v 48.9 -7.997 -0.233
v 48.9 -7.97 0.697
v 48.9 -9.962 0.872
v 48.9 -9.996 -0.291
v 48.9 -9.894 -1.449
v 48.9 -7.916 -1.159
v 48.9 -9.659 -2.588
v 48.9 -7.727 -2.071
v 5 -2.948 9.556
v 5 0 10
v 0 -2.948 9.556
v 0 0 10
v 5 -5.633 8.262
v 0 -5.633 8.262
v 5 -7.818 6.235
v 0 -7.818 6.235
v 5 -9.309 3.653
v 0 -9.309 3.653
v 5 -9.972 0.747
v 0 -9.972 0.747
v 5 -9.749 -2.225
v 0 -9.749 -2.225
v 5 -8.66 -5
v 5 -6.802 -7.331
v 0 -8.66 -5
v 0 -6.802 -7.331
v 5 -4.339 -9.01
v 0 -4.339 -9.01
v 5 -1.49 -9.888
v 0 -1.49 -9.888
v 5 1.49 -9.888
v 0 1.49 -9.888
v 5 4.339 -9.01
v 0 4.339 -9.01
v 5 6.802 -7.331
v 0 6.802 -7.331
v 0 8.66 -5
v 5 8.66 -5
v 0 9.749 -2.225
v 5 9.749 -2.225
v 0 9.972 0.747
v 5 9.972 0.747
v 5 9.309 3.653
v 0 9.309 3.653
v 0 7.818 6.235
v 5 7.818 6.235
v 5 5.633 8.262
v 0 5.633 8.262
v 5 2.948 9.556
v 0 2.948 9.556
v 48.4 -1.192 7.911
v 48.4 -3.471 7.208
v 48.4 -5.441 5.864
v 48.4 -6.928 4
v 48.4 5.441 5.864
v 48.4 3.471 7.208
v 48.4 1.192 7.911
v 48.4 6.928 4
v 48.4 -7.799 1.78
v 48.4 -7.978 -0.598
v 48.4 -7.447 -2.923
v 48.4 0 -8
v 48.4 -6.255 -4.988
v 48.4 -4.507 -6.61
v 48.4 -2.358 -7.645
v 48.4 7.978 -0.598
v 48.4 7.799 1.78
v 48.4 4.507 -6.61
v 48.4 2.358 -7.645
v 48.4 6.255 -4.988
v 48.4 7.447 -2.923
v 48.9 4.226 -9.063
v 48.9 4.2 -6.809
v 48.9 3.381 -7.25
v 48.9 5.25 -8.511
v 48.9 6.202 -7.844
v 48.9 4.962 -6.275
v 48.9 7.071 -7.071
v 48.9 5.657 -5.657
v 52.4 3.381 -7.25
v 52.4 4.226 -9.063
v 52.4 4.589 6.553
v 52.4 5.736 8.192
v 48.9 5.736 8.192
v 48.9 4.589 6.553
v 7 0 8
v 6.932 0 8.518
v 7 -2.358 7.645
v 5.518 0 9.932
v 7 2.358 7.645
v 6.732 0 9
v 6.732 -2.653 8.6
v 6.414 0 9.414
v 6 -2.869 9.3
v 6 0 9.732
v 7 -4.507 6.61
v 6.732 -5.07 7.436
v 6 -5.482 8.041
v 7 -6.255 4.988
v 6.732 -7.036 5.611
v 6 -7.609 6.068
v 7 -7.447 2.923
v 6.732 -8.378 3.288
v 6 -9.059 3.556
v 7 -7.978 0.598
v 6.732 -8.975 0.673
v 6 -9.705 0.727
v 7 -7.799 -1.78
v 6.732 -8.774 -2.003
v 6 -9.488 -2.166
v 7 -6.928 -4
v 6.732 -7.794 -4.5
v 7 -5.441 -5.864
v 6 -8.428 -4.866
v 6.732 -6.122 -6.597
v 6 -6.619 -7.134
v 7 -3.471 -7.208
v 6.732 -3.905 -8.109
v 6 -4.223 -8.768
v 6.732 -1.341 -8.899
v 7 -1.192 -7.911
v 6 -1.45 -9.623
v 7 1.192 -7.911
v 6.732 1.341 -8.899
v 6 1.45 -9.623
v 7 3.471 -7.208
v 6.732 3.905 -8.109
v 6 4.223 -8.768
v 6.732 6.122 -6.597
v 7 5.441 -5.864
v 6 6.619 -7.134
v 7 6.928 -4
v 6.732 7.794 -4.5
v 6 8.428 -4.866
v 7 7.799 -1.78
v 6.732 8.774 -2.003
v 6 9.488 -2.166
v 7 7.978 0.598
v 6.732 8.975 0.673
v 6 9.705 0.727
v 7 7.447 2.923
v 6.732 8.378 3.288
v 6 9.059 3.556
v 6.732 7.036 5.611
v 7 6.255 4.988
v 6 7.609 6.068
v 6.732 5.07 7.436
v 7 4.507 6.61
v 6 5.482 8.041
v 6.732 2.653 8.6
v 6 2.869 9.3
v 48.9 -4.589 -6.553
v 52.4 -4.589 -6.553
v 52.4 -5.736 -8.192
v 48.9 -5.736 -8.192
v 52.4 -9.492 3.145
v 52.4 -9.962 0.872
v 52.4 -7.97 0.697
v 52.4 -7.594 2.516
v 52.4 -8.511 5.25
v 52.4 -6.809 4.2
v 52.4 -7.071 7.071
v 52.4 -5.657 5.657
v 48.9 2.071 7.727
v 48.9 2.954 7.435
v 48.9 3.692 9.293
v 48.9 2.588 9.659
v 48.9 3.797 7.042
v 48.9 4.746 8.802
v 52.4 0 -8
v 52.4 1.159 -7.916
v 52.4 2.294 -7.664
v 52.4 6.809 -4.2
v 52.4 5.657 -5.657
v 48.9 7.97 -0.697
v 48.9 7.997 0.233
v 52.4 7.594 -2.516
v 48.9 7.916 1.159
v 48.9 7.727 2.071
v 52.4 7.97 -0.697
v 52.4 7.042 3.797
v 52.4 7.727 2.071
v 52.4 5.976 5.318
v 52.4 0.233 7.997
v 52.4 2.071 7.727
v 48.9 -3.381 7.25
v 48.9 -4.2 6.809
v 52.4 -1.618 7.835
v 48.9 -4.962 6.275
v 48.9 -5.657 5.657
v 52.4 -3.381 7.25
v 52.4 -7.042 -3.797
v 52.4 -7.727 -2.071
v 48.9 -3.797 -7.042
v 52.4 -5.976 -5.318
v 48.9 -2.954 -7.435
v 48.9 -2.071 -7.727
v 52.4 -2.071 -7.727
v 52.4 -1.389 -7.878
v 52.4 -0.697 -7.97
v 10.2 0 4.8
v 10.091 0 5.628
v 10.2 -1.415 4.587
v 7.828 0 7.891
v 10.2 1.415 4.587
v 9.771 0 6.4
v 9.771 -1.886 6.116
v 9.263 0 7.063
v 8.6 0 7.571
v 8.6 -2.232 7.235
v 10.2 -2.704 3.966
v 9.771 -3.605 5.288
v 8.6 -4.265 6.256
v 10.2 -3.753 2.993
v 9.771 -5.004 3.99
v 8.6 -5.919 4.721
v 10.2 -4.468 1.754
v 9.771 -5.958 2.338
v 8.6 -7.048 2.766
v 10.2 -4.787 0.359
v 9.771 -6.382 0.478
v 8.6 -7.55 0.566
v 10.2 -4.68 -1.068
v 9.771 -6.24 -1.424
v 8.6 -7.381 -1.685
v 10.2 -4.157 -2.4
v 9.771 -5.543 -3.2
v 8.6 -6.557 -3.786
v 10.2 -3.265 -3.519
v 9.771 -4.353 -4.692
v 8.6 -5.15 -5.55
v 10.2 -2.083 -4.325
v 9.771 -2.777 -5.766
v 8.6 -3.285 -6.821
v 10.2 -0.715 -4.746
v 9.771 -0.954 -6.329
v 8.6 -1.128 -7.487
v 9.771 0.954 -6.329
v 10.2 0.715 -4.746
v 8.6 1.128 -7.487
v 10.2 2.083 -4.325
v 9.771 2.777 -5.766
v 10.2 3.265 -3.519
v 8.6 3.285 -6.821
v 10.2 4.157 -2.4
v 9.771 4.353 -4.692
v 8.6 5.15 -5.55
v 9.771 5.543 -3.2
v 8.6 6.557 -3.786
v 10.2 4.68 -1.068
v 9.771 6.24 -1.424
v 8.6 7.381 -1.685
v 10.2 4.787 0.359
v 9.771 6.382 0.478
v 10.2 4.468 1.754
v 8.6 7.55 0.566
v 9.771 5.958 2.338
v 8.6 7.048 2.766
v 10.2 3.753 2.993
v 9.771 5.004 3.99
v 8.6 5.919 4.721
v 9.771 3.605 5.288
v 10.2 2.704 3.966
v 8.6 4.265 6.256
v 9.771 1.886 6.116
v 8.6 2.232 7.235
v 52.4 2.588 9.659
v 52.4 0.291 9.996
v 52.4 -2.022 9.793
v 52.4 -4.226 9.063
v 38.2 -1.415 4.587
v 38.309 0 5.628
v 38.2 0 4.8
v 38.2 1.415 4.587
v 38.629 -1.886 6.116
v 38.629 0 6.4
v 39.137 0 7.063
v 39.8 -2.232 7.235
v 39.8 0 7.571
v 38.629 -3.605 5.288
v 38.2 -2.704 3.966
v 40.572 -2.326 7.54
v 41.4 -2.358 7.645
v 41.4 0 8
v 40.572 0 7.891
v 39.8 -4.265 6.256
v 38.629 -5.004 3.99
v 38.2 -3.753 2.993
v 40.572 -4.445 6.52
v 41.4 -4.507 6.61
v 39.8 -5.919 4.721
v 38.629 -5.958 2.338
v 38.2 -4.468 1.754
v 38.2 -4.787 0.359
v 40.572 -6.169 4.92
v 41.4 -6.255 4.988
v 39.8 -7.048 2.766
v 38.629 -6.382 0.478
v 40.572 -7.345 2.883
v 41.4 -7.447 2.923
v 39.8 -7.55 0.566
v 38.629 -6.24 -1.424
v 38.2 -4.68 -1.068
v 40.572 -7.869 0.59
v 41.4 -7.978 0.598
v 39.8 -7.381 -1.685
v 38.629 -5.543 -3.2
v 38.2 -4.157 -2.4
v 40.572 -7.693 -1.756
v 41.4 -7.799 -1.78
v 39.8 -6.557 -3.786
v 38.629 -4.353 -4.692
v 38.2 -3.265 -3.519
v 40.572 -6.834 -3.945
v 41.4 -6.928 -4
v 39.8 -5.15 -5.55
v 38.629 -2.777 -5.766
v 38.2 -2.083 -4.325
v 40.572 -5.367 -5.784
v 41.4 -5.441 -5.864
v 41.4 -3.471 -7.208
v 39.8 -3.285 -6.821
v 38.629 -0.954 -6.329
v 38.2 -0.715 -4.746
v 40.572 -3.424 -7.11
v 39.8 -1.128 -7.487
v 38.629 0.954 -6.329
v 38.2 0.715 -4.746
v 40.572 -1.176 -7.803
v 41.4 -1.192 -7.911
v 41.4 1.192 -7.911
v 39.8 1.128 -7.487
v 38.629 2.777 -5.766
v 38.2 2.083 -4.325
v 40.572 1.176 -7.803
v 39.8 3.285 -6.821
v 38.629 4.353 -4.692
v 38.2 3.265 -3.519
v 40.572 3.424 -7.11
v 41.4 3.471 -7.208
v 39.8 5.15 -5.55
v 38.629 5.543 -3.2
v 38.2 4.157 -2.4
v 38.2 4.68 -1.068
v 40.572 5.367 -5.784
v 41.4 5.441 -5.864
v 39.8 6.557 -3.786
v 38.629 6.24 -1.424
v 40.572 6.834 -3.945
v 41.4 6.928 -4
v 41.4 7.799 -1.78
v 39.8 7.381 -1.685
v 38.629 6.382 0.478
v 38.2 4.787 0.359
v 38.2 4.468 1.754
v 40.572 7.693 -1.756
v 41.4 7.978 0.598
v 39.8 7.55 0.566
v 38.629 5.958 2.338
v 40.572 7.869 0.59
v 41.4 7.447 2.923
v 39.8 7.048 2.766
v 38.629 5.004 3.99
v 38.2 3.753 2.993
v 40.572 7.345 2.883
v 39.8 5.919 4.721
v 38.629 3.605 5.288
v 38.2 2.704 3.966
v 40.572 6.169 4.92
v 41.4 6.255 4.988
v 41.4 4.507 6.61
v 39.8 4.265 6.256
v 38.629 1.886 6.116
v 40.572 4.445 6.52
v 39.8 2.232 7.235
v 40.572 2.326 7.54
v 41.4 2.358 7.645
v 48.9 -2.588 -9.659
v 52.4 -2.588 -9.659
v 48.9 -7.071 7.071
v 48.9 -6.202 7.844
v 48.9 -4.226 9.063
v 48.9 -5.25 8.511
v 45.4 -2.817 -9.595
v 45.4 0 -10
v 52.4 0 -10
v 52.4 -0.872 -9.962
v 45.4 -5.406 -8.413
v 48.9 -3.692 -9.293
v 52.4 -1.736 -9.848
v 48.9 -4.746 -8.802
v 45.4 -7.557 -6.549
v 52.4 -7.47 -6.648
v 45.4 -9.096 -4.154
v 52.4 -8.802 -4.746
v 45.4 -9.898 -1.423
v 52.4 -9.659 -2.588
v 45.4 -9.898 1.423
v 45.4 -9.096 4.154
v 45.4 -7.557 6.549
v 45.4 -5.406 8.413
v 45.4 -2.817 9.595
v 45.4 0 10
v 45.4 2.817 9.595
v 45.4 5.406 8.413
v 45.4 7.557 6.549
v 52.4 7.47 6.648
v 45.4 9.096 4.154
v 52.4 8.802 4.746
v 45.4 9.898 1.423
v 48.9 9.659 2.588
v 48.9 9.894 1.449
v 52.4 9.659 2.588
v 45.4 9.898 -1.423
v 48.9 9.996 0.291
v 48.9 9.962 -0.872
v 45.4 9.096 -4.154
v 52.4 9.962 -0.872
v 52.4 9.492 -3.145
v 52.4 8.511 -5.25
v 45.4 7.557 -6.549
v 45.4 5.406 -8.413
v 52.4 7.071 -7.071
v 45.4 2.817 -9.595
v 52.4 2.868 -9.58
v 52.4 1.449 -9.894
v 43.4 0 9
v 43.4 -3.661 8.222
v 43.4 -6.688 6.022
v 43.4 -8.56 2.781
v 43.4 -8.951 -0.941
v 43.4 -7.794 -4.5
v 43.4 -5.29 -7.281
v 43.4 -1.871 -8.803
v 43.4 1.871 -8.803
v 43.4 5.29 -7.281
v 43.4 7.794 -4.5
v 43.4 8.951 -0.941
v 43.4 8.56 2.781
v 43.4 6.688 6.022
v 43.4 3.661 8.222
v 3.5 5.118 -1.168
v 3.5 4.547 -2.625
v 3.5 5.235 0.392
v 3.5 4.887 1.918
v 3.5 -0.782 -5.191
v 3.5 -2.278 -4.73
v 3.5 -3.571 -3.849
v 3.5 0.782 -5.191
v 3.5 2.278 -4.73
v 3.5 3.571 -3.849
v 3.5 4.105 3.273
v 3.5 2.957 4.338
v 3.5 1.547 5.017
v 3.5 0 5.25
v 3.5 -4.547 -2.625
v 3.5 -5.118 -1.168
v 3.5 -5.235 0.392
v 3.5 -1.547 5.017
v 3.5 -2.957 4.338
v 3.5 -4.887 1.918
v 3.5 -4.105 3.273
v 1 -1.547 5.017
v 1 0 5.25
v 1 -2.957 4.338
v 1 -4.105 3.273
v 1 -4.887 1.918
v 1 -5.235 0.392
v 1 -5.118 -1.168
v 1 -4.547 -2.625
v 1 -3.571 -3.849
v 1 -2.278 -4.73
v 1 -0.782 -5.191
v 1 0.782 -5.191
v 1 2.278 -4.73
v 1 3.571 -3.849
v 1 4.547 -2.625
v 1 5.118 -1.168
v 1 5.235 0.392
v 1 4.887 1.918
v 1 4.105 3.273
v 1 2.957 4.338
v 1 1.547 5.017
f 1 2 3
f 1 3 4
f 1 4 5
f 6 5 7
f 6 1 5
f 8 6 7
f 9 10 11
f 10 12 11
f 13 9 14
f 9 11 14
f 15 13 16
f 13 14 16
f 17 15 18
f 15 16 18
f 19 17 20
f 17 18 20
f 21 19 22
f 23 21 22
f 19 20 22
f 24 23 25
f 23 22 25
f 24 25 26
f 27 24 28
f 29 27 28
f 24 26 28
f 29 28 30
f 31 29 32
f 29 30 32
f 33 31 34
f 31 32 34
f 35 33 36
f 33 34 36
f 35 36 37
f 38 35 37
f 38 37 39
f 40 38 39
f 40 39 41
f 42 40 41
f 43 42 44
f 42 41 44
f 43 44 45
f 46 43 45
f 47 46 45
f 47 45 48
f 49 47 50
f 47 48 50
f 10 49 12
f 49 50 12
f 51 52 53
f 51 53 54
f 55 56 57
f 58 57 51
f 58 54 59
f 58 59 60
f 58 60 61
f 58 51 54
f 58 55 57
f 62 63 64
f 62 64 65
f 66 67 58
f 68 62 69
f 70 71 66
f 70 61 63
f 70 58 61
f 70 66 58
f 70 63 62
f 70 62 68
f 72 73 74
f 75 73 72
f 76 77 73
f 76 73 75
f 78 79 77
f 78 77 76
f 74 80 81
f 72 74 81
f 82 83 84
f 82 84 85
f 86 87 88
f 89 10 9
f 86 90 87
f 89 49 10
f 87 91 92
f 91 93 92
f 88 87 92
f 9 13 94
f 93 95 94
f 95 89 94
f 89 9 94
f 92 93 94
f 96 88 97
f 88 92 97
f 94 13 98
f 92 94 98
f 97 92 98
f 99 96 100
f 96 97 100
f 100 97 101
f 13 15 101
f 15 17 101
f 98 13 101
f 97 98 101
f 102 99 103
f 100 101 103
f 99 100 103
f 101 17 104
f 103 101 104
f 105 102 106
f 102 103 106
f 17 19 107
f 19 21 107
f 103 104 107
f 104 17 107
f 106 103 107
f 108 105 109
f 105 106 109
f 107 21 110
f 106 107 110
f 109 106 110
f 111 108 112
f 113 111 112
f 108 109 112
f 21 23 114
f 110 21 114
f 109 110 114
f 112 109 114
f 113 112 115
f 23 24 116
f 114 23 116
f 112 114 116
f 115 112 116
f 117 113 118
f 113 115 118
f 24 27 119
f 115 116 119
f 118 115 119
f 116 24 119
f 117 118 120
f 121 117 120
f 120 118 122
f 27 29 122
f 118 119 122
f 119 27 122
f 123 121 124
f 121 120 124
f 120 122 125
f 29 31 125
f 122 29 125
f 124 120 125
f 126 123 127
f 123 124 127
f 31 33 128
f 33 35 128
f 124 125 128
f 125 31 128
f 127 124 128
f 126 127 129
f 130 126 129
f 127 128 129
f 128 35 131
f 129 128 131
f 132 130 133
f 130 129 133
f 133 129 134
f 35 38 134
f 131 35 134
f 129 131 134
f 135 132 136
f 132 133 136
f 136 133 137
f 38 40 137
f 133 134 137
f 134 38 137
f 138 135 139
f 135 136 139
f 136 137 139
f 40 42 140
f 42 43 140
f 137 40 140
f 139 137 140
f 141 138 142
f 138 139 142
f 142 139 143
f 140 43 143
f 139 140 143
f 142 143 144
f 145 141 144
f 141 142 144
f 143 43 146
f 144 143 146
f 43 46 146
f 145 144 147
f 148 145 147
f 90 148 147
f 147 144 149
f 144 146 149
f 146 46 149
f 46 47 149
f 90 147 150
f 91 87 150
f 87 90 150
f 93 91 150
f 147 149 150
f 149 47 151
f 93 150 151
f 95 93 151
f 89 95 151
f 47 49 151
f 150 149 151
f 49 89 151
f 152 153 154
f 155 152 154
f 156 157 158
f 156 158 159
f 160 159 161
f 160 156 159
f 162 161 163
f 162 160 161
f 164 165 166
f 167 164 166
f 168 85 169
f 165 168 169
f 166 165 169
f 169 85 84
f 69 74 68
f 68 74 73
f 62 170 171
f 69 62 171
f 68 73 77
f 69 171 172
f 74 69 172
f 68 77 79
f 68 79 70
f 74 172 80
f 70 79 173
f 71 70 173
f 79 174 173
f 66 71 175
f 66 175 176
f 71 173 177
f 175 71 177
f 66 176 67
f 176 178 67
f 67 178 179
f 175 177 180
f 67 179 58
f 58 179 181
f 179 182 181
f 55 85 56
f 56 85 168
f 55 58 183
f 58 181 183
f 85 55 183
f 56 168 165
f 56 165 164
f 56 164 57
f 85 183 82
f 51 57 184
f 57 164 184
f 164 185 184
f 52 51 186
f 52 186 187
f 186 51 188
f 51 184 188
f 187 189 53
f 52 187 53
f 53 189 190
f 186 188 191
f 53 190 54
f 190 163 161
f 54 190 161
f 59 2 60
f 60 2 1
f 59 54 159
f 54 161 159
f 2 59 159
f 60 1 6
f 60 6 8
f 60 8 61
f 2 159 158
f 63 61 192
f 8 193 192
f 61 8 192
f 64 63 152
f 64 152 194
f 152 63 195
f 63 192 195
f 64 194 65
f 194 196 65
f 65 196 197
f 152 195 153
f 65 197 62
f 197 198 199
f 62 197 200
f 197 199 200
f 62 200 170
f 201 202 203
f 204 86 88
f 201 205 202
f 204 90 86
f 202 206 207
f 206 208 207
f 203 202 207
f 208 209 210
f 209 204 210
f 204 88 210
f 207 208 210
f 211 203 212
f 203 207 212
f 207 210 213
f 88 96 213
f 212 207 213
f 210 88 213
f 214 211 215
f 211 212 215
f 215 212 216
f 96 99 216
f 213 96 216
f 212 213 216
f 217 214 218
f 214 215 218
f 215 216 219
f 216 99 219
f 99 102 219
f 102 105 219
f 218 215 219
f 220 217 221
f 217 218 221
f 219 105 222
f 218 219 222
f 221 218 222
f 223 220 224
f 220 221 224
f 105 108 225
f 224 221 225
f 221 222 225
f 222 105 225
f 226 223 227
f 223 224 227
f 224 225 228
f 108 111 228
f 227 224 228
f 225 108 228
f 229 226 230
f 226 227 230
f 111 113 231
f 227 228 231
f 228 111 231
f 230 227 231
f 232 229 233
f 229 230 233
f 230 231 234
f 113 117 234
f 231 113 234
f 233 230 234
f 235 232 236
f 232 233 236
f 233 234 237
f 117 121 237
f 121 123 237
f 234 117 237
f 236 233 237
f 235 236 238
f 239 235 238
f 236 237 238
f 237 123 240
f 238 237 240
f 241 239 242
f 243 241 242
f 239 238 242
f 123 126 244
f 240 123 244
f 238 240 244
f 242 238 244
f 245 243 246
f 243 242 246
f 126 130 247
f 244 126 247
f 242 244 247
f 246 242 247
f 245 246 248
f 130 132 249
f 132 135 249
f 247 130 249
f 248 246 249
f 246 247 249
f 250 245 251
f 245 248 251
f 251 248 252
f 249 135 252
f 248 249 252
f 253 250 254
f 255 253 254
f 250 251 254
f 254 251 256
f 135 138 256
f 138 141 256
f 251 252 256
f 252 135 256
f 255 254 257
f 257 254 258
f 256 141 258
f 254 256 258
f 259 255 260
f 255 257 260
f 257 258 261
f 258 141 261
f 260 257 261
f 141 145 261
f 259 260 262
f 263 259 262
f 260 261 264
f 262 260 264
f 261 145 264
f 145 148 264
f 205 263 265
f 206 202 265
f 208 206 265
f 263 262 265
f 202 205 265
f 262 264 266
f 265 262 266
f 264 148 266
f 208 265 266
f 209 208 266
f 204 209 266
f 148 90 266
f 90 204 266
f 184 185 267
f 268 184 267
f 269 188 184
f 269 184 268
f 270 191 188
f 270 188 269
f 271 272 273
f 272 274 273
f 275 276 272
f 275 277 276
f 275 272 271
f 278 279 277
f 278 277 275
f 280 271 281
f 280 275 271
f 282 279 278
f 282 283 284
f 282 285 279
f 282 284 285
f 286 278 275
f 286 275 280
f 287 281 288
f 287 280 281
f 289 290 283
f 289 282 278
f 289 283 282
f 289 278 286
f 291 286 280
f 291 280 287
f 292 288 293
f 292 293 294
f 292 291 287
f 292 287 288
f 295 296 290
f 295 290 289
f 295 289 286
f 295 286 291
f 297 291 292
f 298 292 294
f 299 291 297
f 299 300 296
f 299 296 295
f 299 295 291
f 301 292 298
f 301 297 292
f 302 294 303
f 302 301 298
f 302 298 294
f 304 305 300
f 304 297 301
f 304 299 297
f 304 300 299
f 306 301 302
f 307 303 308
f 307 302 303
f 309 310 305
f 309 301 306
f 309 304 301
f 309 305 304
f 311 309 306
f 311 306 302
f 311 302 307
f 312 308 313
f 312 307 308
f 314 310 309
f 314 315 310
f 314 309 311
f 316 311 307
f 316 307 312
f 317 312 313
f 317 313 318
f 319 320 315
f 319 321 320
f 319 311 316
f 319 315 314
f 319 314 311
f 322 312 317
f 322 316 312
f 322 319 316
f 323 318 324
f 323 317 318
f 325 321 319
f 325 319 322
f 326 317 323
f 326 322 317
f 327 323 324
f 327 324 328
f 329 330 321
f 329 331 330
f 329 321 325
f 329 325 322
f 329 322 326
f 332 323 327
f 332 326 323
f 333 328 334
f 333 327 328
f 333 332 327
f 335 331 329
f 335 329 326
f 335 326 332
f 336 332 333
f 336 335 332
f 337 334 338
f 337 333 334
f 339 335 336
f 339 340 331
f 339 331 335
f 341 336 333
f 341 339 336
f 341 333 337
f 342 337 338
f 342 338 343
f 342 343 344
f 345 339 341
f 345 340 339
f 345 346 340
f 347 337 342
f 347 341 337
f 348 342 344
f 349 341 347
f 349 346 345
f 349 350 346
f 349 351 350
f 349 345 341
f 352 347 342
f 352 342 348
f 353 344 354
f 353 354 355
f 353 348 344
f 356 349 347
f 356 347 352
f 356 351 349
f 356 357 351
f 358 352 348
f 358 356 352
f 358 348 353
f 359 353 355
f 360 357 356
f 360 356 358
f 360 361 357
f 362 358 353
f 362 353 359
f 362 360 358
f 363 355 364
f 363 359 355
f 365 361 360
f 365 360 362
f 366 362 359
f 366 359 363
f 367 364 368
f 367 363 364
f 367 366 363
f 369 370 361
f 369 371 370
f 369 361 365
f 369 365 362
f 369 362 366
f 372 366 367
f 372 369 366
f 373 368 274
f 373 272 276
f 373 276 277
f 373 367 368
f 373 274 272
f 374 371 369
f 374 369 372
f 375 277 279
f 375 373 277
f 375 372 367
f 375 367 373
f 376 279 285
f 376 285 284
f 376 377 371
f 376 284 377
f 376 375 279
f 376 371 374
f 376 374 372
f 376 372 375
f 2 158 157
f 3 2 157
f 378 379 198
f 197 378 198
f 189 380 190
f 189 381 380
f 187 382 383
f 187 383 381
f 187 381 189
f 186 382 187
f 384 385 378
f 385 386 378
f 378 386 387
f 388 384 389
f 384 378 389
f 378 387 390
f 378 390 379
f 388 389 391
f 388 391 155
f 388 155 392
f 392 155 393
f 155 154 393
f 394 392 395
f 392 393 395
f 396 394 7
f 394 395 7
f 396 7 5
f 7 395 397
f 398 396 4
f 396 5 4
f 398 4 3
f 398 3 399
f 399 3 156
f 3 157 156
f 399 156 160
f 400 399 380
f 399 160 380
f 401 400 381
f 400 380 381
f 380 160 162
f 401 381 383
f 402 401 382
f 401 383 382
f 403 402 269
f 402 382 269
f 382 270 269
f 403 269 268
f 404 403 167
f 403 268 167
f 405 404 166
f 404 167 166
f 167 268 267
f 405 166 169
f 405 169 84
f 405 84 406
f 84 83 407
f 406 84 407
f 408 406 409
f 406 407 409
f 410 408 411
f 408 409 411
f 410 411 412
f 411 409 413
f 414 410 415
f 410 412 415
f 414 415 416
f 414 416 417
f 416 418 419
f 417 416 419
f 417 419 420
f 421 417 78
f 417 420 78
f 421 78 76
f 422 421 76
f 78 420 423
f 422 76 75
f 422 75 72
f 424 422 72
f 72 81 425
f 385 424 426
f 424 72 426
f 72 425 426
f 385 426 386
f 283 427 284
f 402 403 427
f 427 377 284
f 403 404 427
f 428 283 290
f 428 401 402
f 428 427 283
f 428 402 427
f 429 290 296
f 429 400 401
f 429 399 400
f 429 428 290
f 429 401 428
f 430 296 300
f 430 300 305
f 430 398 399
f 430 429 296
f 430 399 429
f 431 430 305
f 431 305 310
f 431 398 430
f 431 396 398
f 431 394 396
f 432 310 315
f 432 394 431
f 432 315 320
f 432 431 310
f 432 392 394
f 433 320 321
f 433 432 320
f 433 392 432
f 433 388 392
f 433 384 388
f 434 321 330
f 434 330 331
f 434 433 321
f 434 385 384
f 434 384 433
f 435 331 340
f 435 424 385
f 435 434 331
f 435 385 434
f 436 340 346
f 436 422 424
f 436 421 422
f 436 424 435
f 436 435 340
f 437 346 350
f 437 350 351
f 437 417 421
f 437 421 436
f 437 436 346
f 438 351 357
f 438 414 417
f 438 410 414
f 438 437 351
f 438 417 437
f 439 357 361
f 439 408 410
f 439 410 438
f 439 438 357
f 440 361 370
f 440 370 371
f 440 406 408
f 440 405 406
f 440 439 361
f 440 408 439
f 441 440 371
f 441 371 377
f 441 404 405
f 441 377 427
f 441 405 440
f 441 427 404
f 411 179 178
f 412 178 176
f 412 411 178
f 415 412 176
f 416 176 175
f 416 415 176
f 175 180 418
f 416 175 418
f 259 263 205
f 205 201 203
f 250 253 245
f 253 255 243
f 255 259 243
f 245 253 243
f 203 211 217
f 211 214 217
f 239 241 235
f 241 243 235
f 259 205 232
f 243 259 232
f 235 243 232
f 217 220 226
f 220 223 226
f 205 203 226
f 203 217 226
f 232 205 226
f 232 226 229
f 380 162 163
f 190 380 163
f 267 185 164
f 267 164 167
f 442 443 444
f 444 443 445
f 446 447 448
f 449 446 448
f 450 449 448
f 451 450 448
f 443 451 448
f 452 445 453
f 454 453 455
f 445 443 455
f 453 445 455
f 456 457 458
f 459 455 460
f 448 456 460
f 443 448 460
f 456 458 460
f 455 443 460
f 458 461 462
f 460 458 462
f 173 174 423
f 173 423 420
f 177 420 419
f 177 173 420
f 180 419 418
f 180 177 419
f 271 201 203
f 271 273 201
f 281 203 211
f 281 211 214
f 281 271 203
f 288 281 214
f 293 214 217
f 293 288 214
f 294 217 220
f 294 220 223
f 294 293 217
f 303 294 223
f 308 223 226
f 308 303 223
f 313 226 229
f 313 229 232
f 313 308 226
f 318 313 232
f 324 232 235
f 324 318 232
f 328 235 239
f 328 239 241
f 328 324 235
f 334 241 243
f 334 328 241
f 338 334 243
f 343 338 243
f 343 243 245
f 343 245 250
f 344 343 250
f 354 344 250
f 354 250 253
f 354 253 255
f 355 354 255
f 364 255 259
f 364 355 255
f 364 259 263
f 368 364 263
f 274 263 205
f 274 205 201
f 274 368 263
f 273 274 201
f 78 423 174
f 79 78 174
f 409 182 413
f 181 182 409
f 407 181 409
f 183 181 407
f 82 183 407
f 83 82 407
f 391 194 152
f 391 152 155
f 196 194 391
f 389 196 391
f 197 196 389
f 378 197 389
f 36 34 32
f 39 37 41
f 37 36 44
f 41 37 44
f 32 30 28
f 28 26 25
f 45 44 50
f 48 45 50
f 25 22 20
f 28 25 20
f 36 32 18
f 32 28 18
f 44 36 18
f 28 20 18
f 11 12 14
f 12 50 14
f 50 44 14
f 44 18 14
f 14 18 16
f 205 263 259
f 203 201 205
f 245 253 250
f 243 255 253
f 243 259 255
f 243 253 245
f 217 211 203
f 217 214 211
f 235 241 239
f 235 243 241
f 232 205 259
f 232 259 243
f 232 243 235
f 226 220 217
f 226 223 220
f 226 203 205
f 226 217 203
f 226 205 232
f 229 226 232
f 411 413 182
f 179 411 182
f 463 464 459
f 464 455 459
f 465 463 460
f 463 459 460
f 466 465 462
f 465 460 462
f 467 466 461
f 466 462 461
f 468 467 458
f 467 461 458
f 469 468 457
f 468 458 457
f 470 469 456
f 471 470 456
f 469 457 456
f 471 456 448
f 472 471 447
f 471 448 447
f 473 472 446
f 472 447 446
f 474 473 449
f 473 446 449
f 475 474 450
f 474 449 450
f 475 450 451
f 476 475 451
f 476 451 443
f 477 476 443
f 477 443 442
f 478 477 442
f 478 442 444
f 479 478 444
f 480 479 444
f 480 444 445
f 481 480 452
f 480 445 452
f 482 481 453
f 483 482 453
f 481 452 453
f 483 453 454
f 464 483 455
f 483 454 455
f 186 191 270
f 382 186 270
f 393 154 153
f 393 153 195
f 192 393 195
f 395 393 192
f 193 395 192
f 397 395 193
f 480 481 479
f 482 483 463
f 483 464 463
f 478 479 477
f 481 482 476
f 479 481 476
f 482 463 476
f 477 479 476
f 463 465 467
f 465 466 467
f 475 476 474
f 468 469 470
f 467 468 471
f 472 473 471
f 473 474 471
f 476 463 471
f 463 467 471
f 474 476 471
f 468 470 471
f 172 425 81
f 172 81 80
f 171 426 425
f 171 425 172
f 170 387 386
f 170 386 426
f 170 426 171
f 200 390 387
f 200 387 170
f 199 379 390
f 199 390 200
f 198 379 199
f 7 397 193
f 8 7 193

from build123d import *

# Parameters (mm, degrees)
SKETCH_1708_W       = 7
SKETCH_1708_H       = 10
SKETCH_18_R         = 8
CUT_EXTRUDE_4_DEPTH = 4
CUT_EXTRUDE_5_DEPTH = 3.5


with BuildPart() as part:
    # Sketch 917 → Повернуть4 (revolve)
    with BuildSketch(Plane.XY, mode=Mode.PRIVATE) as revolve_4_sk:
        with BuildLine():
            Line((10.2, 4.8), (38.2, 4.8))
            ThreePointArc((38.2, 4.8), (39.1372583, 7.0627417), (41.4, 8))
            Line((41.4, 8), (45.4, 10))
            Line((45.4, 10), (45.4, 0))
            Line((45.4, 0), (10.2, 0))
            Line((10.2, 0), (10.2, 4.8))
        make_face()
    revolve(revolve_4_sk.sketch.rotate(Axis((10.2, 0, 0), (1, 0, 0)), 90), axis=Axis((10.2, 0, 0), (1, 0, 0)))

    # Sketch 1708 → Повернуть7 (revolve)
    with BuildSketch(Plane.XY, mode=Mode.PRIVATE) as revolve_7_sk:
        with Locations((48.9, 5)):
            Rectangle(SKETCH_1708_W, SKETCH_1708_H)
    revolve(revolve_7_sk.sketch.rotate(Axis((52.4, 0, 0), (-1, 0, 0)), 90), axis=Axis((52.4, 0, 0), (-1, 0, 0)))

    # Эскиз18 → Вырез-Вытянуть4 (cut)
    with BuildSketch(Plane(origin=(52.4, 0, 0), x_dir=(0, 0, -1), z_dir=(1, 0, 0))):
        Circle(SKETCH_18_R)
    extrude(amount=-CUT_EXTRUDE_4_DEPTH, mode=Mode.SUBTRACT)

    # Эскиз19 → Вырез-Вытянуть5 (cut)
    with BuildSketch(Plane(origin=(52.4, 0, 0), x_dir=(0, 0, -1), z_dir=(1, 0, 0))):
        with BuildLine():
            Line((-8.191520443, 5.735764364), (-6.553216354, 4.588611491))
            ThreePointArc((-6.553216354, 4.588611491), (-7.250462296, 3.380946094), (-7.72740661, 2.070552361))
            Line((-7.72740661, 2.070552361), (-9.659258263, 2.588190451))
            ThreePointArc((-9.659258263, 2.588190451), (-9.06307787, 4.226182617), (-8.191520443, 5.735764364))
        make_face()
        with BuildLine():
            Line((-2.588190451, 9.659258263), (-2.070552361, 7.72740661))
            ThreePointArc((-2.070552361, 7.72740661), (-0.697245942, 7.969557585), (0.697245942, 7.969557585))
            Line((0.697245942, 7.969557585), (0.871557427, 9.961946981))
            ThreePointArc((0.871557427, 9.961946981), (-0.871557427, 9.961946981), (-2.588190451, 9.659258263))
        make_face()
        with BuildLine():
            Line((7.071067812, 7.071067812), (5.656854249, 5.656854249))
            ThreePointArc((5.656854249, 5.656854249), (6.553216354, 4.588611491), (7.250462296, 3.380946094))
            Line((7.250462296, 3.380946094), (9.06307787, 4.226182617))
            ThreePointArc((9.06307787, 4.226182617), (8.191520443, 5.735764364), (7.071067812, 7.071067812))
        make_face()
        with BuildLine():
            Line((9.659258263, -2.588190451), (7.72740661, -2.070552361))
            ThreePointArc((7.72740661, -2.070552361), (7.250462296, -3.380946094), (6.553216354, -4.588611491))
            Line((6.553216354, -4.588611491), (8.191520443, -5.735764364))
            ThreePointArc((8.191520443, -5.735764364), (9.06307787, -4.226182617), (9.659258263, -2.588190451))
        make_face()
        with BuildLine():
            Line((2.588190451, -9.659258263), (2.070552361, -7.72740661))
            ThreePointArc((2.070552361, -7.72740661), (0.697245942, -7.969557585), (-0.697245942, -7.969557585))
            Line((-0.697245942, -7.969557585), (-0.871557427, -9.961946981))
            ThreePointArc((-0.871557427, -9.961946981), (0.871557427, -9.961946981), (2.588190451, -9.659258263))
        make_face()
        with BuildLine():
            Line((-7.071067812, -7.071067812), (-5.656854249, -5.656854249))
            ThreePointArc((-5.656854249, -5.656854249), (-6.553216354, -4.588611491), (-7.250462296, -3.380946094))
            Line((-7.250462296, -3.380946094), (-9.06307787, -4.226182617))
            ThreePointArc((-9.06307787, -4.226182617), (-8.191520443, -5.735764364), (-7.071067812, -7.071067812))
        make_face()
    extrude(amount=-CUT_EXTRUDE_5_DEPTH, mode=Mode.SUBTRACT)


with BuildPart() as body_2:
    # Sketch 177 → Повернуть6 (revolve)
    with BuildSketch(Plane.XY, mode=Mode.PRIVATE) as revolve_6_sk:
        Polygon((0, 10), (0, 0), (1, 0), (1, 5.25), (3.5, 5.25), (3.5, 0), (5, 0), (5, 10), align=None)
        with BuildLine():
            ThreePointArc((7, 8), (6.414213562, 9.414213562), (5, 10))
            Line((5, 10), (5, 0))
            Line((5, 0), (7, 0))
            Line((7, 0), (7, 8))
        make_face()
        with BuildLine():
            ThreePointArc((10.2, 4.8), (9.2627417, 7.0627417), (7, 8))
            Line((7, 8), (7, 0))
            Line((7, 0), (10.2, 0))
            Line((10.2, 0), (10.2, 4.8))
        make_face()
    revolve(revolve_6_sk.sketch.rotate(Axis((0, 0, 0), (1, 0, 0)), 90), axis=Axis((0, 0, 0), (1, 0, 0)))


solid = Compound([part.part, body_2.part])
